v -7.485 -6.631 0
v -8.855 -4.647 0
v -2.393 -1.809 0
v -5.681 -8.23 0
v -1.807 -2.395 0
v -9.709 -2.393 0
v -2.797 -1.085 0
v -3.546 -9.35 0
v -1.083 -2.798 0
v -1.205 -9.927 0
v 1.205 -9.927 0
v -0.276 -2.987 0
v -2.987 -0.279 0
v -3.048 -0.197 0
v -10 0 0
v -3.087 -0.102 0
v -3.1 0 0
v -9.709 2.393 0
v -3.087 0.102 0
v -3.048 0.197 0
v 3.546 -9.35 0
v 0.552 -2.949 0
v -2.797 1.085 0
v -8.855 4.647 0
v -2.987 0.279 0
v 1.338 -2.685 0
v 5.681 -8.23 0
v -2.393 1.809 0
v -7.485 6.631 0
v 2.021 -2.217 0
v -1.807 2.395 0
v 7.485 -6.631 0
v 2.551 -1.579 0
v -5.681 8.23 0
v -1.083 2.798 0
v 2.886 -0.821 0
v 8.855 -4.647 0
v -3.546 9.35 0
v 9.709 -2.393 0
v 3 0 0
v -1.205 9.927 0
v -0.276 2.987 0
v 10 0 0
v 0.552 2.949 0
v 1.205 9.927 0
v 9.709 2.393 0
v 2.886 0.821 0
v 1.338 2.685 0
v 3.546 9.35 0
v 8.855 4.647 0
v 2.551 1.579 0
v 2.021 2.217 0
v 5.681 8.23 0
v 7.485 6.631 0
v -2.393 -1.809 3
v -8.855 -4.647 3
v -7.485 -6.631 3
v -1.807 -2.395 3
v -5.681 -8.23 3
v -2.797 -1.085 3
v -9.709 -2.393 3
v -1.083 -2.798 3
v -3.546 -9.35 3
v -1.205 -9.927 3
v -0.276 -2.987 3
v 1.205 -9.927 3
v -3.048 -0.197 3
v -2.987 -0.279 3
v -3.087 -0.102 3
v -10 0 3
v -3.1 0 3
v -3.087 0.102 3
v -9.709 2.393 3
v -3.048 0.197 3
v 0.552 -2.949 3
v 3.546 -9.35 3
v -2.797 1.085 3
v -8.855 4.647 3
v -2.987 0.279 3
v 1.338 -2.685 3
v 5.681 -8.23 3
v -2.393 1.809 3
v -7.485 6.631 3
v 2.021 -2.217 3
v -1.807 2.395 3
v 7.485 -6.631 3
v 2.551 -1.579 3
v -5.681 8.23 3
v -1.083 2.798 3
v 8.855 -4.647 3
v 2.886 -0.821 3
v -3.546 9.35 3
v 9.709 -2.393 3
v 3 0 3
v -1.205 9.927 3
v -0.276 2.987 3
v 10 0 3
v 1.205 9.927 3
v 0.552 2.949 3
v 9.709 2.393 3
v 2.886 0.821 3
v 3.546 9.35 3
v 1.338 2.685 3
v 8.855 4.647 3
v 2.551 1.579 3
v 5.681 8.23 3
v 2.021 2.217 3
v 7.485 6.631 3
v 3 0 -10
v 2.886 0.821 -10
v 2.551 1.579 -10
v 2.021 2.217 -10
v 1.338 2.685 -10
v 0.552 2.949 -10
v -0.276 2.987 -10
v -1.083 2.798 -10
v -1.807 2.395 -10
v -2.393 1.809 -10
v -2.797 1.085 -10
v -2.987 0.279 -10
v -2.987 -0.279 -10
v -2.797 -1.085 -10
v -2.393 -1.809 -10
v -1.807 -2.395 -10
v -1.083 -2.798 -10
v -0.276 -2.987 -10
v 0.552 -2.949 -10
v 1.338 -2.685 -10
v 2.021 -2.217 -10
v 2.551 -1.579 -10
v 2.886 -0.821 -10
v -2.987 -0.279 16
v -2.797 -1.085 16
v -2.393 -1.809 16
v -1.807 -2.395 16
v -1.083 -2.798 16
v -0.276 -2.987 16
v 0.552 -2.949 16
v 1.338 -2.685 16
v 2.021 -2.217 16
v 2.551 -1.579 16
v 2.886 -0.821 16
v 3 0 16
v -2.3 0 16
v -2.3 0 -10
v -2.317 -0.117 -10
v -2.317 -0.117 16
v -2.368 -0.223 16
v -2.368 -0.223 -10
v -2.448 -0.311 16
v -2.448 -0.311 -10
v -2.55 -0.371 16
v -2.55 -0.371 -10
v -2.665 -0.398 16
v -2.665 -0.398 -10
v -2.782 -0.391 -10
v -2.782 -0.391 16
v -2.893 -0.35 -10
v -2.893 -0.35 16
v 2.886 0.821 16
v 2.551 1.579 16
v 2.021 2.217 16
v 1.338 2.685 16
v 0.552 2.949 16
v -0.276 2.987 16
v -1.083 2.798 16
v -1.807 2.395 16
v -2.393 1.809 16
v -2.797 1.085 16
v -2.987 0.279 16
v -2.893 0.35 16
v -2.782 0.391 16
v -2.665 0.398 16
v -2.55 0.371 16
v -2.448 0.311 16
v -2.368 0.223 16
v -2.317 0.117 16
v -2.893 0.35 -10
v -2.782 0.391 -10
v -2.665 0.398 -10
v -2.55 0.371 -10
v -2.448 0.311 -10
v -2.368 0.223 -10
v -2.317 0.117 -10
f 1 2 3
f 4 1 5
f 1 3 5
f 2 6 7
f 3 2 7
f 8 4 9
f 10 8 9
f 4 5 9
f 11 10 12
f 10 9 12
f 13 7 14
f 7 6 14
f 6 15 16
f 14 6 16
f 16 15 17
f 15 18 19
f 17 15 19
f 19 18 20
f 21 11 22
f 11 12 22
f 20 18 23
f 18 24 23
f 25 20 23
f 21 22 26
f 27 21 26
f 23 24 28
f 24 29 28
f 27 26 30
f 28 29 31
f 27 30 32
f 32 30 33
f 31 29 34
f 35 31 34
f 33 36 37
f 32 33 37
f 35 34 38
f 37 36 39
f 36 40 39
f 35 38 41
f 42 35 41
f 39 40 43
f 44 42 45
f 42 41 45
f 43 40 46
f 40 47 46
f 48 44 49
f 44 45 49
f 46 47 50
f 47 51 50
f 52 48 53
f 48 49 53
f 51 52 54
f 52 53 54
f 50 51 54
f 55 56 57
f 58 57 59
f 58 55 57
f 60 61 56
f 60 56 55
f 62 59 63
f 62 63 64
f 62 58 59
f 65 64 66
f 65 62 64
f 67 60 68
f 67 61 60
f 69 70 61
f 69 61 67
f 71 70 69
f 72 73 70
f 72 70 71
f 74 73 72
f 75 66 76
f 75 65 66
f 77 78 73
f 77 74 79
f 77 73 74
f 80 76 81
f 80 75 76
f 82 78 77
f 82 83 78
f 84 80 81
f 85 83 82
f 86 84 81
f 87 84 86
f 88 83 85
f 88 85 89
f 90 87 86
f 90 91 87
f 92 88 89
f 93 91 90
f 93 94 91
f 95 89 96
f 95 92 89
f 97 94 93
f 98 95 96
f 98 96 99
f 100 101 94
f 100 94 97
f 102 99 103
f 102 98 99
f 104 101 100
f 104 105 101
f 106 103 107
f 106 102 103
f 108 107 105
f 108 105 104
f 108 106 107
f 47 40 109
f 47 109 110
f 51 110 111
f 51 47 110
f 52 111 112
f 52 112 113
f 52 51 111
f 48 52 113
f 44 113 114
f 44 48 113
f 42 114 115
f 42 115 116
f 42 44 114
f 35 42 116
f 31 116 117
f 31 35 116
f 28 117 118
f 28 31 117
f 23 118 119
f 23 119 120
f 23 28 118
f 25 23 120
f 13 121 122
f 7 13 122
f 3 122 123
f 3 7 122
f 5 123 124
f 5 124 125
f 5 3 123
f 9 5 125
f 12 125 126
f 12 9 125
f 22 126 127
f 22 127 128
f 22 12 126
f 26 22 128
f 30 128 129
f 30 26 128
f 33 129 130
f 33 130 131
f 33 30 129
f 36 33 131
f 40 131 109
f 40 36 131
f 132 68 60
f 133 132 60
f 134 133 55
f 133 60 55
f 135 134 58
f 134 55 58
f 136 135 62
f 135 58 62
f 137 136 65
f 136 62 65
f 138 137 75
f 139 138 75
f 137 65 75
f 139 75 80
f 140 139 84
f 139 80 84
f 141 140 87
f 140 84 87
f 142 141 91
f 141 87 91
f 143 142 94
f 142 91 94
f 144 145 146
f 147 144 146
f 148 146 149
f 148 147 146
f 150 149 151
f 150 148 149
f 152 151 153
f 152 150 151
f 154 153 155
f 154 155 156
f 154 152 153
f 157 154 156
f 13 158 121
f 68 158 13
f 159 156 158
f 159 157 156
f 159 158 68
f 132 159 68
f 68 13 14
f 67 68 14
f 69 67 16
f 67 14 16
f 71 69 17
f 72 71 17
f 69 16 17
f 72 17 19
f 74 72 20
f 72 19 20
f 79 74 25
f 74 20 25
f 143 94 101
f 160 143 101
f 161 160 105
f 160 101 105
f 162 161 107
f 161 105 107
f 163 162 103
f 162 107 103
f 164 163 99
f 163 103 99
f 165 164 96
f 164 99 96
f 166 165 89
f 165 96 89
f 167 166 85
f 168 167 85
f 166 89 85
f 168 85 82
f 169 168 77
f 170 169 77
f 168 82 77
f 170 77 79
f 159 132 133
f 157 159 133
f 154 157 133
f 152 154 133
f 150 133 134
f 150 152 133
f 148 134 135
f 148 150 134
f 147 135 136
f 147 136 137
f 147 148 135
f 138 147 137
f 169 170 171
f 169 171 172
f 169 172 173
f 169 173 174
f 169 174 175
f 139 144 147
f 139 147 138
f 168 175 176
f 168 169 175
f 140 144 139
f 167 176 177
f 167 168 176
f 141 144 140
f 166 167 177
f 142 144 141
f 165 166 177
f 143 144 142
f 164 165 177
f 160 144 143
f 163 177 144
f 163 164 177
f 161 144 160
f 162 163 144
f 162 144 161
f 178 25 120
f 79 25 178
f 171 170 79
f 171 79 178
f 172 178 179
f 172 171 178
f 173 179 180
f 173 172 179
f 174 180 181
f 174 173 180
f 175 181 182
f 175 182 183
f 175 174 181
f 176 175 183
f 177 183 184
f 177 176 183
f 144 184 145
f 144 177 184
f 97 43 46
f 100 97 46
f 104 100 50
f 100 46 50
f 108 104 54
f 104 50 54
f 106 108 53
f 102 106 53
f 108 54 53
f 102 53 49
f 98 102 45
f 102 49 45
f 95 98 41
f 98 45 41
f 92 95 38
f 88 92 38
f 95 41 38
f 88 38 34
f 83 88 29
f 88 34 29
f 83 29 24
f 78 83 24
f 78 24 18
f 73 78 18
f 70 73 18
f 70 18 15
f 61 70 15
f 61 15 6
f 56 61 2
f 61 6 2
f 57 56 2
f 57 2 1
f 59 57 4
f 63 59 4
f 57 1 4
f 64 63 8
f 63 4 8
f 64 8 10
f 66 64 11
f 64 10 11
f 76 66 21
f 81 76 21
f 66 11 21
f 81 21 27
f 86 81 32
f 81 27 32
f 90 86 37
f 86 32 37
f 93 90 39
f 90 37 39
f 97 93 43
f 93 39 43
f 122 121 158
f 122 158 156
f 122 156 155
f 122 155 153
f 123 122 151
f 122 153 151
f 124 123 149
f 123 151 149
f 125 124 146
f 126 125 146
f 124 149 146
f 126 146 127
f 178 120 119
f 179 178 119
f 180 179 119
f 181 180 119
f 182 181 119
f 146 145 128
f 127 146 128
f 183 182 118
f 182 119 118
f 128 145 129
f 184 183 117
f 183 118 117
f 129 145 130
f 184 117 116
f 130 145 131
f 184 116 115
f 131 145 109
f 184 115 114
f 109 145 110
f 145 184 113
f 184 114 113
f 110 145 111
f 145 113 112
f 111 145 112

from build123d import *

# Parameters (mm, degrees)
F0_R     = 10
F1_DEPTH = 3
F0_R_2   = 1.65
F2_DEPTH = 16
F3_DEPTH = 10


with BuildPart() as f1:
    # F0 (on Top) → F1 (new body)
    with BuildSketch(Plane.XY):
        Circle(F0_R)
        with BuildLine():
            ThreePointArc((-2.987037, 0.278585), (0.139443, 2.996758), (3, 0))
            ThreePointArc((3, 0), (0.139443, -2.996758), (-2.987037, -0.278585))
            ThreePointArc((-2.987037, -0.278585), (-3.1, 0), (-2.987037, 0.278585))
        make_face(mode=Mode.SUBTRACT)
    extrude(amount=F1_DEPTH)

    # F0 (on Top) → F2 (join)
    with BuildSketch(Plane.XY):
        with BuildLine():
            ThreePointArc((-2.987037, -0.278585), (0.139443, -2.996758), (3, 0))
            ThreePointArc((3, 0), (0.139443, 2.996758), (-2.987037, 0.278585))
            ThreePointArc((-2.987037, 0.278585), (-2.549692, 0.370685), (-2.3, 0))
            ThreePointArc((-2.3, 0), (-2.549692, -0.370685), (-2.987037, -0.278585))
        make_face()
        Circle(F0_R_2, mode=Mode.SUBTRACT)
        Circle(F0_R_2)
    extrude(amount=F2_DEPTH)

    # F0 (on Top) → F3 (join)
    with BuildSketch(Plane.XY):
        with BuildLine():
            ThreePointArc((-2.987037, -0.278585), (0.139443, -2.996758), (3, 0))
            ThreePointArc((3, 0), (0.139443, 2.996758), (-2.987037, 0.278585))
            ThreePointArc((-2.987037, 0.278585), (-2.549692, 0.370685), (-2.3, 0))
            ThreePointArc((-2.3, 0), (-2.549692, -0.370685), (-2.987037, -0.278585))
        make_face()
        Circle(F0_R_2, mode=Mode.SUBTRACT)
        Circle(F0_R_2)
    extrude(amount=-F3_DEPTH)


solid = f1.part
